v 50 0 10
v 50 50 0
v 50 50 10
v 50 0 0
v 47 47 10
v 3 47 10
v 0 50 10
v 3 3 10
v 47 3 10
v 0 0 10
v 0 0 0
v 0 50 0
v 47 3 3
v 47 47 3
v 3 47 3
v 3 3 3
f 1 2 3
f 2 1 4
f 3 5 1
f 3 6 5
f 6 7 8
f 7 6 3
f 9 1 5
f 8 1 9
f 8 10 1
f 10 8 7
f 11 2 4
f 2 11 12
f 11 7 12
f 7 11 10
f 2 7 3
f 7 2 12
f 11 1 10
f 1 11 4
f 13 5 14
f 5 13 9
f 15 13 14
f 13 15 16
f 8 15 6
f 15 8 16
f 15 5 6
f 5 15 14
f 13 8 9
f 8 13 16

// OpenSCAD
// Generated by HEIDI for job job_1787760748170_6fe26f35
// Product: 3D-Printable Model Preparation Package
// Request: E2E production path qualification test — automated cleanup expected
// Model type: box
// Generated: 2026-09-07T04:35:15.097Z
//
// This is a parameterized OpenSCAD model. You can adjust the
// parameters below to customize the dimensions before rendering.

// ─── Parameters ───
width = 50;       // X dimension in mm
height = 50;     // Y dimension in mm
depth = 10;       // Z dimension in mm
wall = 3;    // wall thickness in mm
$fn = 60;               // facet resolution

// Parametric hollow box
module parametric_box() {
    difference() {
        // Outer shell
        cube([width, height, depth]);
        // Inner cavity
        translate([wall, wall, wall])
            cube([width - wall * 2, height - wall * 2, depth - wall + 1]);
    }
}
parametric_box();
